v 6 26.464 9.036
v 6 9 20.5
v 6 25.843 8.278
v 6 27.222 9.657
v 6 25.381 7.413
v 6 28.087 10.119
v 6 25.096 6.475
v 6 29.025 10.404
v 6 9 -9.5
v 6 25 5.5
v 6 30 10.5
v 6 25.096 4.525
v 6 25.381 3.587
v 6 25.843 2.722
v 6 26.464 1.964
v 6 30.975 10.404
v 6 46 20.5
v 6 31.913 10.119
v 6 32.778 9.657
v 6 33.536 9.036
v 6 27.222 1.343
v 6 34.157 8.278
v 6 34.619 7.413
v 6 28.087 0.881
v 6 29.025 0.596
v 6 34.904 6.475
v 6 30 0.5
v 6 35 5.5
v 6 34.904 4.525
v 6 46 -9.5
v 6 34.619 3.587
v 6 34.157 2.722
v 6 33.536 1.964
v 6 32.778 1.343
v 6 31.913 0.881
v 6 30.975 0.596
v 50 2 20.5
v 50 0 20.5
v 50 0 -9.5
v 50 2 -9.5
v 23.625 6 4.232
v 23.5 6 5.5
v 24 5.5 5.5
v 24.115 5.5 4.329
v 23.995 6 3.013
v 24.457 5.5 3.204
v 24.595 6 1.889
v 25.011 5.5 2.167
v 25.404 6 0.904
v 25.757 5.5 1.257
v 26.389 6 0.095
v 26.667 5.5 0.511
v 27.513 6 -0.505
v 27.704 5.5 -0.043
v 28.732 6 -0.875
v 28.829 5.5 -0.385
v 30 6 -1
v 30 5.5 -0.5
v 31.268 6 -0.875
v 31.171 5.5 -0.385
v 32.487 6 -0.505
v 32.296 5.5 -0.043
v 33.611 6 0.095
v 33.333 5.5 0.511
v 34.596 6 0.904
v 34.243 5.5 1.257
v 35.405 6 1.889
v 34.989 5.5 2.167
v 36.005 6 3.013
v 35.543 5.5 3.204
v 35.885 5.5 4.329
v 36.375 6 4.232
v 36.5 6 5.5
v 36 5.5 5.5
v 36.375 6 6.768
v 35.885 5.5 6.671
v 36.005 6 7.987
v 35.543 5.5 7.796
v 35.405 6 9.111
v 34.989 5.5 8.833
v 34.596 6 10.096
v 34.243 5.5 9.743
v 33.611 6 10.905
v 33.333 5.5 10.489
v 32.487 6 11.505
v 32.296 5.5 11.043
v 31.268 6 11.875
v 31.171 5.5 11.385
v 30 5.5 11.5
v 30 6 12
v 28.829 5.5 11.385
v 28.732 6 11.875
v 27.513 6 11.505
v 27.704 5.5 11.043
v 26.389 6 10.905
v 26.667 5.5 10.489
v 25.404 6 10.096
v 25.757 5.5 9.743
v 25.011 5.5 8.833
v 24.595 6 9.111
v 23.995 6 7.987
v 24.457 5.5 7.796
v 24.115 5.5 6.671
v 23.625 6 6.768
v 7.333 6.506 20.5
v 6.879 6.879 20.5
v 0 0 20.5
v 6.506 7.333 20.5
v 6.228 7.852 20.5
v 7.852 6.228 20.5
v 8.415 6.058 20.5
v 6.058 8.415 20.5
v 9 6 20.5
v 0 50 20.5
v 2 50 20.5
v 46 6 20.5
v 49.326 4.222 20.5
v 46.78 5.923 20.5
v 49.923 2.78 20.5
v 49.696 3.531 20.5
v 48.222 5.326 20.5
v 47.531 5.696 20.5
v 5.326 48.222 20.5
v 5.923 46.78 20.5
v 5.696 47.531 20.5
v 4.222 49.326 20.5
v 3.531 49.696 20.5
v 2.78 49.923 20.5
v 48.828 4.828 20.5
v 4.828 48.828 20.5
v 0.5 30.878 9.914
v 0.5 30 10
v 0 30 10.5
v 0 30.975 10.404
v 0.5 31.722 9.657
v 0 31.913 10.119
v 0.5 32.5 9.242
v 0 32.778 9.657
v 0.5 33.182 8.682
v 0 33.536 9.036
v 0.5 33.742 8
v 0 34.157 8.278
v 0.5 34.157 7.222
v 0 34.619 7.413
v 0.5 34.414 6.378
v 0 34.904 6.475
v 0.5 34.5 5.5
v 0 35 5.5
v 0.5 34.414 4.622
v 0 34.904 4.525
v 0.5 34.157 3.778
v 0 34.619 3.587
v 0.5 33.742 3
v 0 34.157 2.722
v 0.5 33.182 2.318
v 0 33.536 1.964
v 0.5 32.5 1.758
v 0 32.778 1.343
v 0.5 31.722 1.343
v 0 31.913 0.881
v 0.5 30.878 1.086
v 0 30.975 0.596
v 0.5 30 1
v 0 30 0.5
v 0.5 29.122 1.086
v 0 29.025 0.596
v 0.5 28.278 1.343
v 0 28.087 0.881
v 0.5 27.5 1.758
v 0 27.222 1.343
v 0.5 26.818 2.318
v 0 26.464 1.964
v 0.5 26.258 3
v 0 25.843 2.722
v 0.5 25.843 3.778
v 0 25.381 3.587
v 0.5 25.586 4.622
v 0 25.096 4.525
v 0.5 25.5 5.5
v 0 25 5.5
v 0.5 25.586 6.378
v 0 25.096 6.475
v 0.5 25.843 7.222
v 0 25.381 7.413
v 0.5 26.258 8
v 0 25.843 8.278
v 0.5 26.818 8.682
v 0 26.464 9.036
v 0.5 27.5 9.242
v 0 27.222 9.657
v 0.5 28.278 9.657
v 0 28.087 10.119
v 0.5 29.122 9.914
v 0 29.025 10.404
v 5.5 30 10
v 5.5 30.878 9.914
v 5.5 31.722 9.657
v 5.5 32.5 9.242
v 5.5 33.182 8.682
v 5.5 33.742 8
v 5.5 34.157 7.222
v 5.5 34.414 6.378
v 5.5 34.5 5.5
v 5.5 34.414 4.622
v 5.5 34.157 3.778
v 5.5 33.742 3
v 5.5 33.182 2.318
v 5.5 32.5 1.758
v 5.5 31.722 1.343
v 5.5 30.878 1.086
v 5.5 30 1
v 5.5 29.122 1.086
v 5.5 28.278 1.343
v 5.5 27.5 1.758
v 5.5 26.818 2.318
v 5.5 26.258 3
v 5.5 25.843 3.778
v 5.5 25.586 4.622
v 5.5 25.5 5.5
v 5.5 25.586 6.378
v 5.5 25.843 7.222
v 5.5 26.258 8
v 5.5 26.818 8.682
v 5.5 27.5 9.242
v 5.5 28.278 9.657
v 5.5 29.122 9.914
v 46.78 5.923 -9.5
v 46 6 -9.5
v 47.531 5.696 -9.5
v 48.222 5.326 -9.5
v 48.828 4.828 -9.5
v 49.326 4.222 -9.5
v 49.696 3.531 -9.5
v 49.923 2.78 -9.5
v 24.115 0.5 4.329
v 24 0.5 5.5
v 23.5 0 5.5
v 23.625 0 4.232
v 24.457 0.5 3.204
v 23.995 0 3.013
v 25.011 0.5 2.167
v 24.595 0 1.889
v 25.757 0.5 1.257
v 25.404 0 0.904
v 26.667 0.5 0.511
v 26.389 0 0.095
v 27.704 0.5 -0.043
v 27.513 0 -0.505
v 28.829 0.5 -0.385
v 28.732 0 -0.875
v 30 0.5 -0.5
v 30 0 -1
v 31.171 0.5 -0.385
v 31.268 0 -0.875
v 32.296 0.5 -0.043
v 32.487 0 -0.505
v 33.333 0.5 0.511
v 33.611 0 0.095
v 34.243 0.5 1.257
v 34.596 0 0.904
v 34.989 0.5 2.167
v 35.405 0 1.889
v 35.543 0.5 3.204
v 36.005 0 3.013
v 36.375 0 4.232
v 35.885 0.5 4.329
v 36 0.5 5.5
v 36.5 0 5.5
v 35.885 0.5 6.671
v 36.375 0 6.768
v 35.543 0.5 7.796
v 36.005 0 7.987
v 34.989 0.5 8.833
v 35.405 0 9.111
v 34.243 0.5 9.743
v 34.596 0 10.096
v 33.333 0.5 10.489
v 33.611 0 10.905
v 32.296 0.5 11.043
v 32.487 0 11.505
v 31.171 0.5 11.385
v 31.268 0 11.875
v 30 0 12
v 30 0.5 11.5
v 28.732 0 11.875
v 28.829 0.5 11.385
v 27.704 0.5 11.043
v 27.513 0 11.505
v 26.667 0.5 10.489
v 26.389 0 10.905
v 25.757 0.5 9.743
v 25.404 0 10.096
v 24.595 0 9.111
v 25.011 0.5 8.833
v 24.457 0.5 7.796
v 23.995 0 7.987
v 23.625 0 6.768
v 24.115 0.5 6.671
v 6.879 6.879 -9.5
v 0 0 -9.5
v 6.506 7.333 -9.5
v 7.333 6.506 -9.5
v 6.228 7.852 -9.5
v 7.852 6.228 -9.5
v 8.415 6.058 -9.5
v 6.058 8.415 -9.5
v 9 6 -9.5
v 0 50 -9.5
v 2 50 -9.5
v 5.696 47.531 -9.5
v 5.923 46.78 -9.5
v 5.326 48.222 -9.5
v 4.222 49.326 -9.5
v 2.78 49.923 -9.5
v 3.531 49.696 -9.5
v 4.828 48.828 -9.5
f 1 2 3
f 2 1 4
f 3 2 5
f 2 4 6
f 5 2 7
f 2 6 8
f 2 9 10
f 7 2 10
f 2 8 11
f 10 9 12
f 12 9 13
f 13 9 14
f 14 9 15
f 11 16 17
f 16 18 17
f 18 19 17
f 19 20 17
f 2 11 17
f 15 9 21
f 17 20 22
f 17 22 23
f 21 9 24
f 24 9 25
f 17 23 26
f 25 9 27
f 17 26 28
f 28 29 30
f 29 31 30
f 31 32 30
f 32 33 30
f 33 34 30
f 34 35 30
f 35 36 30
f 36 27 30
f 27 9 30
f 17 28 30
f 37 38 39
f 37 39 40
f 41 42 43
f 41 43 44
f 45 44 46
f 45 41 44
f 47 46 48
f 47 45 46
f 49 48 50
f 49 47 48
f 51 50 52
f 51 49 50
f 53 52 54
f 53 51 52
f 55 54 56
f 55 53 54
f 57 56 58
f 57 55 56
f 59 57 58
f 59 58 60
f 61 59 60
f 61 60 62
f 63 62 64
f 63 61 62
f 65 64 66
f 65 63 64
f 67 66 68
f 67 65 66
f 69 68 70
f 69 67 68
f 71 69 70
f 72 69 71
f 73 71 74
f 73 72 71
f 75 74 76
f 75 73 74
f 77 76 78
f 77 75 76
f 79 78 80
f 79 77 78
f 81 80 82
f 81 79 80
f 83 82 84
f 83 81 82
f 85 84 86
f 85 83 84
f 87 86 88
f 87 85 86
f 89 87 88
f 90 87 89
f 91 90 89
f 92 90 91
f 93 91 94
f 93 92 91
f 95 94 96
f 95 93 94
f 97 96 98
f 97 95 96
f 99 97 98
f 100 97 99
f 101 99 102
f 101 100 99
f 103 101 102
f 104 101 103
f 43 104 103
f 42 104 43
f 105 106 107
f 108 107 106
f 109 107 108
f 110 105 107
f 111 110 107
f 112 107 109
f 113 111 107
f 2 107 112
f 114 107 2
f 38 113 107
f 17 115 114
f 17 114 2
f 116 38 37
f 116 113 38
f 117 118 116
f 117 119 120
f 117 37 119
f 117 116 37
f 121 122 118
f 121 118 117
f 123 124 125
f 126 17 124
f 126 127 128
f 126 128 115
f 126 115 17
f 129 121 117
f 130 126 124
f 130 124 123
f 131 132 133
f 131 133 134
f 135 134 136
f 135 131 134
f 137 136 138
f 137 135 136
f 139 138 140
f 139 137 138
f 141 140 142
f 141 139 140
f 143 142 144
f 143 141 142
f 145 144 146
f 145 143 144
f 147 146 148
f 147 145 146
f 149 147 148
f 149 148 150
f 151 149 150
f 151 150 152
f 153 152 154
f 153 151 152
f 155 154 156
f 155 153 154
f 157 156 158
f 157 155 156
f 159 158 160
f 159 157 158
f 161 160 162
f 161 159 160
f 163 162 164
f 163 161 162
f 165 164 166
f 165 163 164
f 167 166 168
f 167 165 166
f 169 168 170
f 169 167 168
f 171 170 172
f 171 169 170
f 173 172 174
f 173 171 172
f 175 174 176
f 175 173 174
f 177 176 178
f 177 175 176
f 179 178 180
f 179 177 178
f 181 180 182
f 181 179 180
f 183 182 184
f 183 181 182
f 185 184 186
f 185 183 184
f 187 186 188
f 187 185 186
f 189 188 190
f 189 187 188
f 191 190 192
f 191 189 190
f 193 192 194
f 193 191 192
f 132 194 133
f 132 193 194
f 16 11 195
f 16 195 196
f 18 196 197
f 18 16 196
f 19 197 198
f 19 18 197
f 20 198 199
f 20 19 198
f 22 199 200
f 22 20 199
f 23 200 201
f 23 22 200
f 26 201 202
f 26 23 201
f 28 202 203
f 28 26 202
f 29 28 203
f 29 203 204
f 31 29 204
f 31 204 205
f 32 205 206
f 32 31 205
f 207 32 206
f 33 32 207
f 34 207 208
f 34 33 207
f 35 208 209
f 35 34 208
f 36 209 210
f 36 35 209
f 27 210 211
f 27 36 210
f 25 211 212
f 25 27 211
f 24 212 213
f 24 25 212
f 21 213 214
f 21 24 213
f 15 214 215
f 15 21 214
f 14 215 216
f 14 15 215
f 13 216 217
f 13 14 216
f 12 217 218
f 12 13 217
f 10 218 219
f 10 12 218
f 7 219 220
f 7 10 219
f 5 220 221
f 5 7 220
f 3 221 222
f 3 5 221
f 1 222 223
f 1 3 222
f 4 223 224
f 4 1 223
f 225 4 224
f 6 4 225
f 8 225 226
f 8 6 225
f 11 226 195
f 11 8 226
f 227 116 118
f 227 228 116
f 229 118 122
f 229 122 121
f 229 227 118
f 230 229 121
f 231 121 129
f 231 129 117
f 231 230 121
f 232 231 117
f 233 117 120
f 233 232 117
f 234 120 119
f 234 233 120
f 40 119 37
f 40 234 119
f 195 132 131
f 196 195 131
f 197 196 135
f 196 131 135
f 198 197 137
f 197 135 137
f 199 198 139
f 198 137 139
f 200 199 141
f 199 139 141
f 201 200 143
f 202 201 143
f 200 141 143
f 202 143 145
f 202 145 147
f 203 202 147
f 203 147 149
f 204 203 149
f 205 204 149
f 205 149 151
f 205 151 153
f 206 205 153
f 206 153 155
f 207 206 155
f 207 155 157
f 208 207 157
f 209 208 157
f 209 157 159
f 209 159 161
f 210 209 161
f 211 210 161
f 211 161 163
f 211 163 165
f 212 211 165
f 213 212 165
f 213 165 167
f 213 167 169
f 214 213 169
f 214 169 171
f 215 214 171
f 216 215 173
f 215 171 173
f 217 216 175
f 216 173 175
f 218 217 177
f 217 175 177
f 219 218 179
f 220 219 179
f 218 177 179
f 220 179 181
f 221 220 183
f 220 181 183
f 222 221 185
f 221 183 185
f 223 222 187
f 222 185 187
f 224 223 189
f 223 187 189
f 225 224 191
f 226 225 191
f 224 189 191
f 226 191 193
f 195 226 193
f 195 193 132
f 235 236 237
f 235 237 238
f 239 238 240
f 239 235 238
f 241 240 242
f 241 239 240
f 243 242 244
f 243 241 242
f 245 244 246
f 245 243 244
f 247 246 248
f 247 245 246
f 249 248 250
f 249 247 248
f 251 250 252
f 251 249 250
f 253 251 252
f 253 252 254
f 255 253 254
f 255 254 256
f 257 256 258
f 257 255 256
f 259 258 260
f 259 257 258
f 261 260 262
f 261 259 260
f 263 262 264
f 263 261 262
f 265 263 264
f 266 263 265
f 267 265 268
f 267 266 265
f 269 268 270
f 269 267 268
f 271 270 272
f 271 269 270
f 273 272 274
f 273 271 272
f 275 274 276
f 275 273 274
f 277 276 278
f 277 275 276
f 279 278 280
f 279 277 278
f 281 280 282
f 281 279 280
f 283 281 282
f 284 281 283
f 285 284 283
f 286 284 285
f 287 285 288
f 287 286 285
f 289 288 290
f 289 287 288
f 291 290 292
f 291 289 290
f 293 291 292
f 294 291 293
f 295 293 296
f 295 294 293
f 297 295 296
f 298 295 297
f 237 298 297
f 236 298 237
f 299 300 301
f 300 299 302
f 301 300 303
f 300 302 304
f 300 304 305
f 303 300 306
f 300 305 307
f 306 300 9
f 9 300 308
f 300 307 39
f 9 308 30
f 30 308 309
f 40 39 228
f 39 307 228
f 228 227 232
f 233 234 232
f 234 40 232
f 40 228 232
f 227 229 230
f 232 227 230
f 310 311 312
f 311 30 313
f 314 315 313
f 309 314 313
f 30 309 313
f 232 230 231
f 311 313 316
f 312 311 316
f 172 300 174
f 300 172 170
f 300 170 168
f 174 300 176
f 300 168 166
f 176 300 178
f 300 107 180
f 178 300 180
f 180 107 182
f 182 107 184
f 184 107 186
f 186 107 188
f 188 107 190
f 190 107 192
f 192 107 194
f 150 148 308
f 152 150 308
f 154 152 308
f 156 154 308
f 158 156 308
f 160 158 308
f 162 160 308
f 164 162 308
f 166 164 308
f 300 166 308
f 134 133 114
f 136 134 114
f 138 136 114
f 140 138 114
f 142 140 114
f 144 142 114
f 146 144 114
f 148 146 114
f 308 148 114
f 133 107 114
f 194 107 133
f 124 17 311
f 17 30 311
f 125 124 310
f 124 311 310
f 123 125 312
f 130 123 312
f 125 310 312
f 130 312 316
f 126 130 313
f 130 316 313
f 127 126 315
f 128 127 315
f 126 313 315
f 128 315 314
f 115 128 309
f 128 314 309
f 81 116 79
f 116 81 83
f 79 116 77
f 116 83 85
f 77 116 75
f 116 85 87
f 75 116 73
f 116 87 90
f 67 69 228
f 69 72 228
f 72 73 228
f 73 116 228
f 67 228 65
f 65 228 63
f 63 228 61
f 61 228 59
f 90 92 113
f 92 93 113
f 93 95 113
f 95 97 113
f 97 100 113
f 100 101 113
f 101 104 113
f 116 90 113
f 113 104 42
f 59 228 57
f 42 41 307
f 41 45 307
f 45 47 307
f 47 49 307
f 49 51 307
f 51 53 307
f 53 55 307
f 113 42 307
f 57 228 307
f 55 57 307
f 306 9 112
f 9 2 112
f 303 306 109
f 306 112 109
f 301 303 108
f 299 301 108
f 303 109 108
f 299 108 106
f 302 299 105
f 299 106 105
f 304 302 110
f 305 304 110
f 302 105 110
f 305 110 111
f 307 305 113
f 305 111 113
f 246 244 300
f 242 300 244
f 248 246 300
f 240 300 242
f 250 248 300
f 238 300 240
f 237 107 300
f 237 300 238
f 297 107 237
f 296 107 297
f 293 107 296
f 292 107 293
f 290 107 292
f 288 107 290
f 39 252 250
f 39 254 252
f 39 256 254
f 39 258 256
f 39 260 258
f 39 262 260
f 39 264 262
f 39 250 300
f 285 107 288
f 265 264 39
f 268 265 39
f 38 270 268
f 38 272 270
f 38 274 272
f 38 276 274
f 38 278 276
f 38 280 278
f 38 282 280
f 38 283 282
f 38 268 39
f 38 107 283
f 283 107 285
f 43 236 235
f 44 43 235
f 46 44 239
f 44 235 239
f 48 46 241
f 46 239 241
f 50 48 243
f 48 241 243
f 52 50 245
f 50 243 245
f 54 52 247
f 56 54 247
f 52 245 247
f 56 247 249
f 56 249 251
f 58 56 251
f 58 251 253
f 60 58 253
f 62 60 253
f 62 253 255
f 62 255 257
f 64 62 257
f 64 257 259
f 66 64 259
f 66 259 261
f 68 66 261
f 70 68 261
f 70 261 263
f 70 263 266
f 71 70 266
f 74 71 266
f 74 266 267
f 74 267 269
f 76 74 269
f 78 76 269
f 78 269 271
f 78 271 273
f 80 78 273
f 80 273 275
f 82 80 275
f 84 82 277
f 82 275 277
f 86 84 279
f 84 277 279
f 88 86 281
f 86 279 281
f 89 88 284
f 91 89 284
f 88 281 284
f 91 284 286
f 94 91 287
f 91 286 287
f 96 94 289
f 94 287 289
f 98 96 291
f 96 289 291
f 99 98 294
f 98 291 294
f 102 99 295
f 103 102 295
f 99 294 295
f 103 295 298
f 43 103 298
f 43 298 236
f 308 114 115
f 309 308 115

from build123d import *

# Parameters (mm, degrees)
ESQUISSE1_W                     = 50
ESQUISSE1_H                     = 50
BOSS_EXTRU_1_DEPTH              = 30
ESQUISSE2_W                     = 84
ESQUISSE2_H                     = 84
ENL_V_MAT_EXTRU_1_DEPTH         = 77.811457479
DIAM_TRE_DU_PER_AGE_12_0_12_1_D = 12
DIAM_TRE_DU_PER_AGE_9_0_9_2_D   = 9
CHANFREIN1_SIZE                 = 0.5
CONG_1_R                        = 3
CONG_2_R                        = 4.00000002


with BuildPart() as part:
    # Esquisse1 → Boss.-Extru.1 (new body)
    with BuildSketch(Plane.XY.offset(20.5)):
        with Locations((25, 25)):
            Rectangle(ESQUISSE1_W, ESQUISSE1_H)
    extrude(amount=-BOSS_EXTRU_1_DEPTH)

    # Esquisse2 → Enlèv. mat.-Extru.1 (cut, through all)
    with BuildSketch(Plane(origin=(0, 0, -9.5), x_dir=(-1, 0, 0), z_dir=(0, 0, -1))):
        with Locations((-48, 48)):
            Rectangle(ESQUISSE2_W, ESQUISSE2_H)
    extrude(amount=-ENL_V_MAT_EXTRU_1_DEPTH, mode=Mode.SUBTRACT)

    # Diamètre du perçage Ø12.0 (12)1 (through all)
    with Locations(Plane(origin=(0, 6, 0), x_dir=(1, 0, 0), z_dir=(0, 1, 0))):
        with Locations((30, -5.5)):
            Hole(DIAM_TRE_DU_PER_AGE_12_0_12_1_D / 2)

    # Diamètre du perçage Ø9.0 (9)2 (through all)
    with Locations(Plane(origin=(6, 0, 0), x_dir=(0, 0, -1), z_dir=(1, 0, 0))):
        with Locations((-5.5, 30)):
            Hole(DIAM_TRE_DU_PER_AGE_9_0_9_2_D / 2)

    # Chanfrein1
    chanfrein1_edges = [part.edges().sort_by_distance(p)[0] for p in [
        (36, 6, 5.5),
        (36, 0, 5.5),
        (6, 30, 1),
        (0, 30, 1),
    ]]
    chamfer(chanfrein1_edges, length=CHANFREIN1_SIZE)

    # Congé1
    cong_1_edges = [part.edges().sort_by_distance(p)[0] for p in [
        (6, 6, 5.5),
    ]]
    fillet(cong_1_edges, radius=CONG_1_R)

    # Congé2
    cong_2_edges = [part.edges().sort_by_distance(p)[0] for p in [
        (50, 6, 5.5),
        (6, 50, 5.5),
    ]]
    fillet(cong_2_edges, radius=CONG_2_R)


solid = part.part
